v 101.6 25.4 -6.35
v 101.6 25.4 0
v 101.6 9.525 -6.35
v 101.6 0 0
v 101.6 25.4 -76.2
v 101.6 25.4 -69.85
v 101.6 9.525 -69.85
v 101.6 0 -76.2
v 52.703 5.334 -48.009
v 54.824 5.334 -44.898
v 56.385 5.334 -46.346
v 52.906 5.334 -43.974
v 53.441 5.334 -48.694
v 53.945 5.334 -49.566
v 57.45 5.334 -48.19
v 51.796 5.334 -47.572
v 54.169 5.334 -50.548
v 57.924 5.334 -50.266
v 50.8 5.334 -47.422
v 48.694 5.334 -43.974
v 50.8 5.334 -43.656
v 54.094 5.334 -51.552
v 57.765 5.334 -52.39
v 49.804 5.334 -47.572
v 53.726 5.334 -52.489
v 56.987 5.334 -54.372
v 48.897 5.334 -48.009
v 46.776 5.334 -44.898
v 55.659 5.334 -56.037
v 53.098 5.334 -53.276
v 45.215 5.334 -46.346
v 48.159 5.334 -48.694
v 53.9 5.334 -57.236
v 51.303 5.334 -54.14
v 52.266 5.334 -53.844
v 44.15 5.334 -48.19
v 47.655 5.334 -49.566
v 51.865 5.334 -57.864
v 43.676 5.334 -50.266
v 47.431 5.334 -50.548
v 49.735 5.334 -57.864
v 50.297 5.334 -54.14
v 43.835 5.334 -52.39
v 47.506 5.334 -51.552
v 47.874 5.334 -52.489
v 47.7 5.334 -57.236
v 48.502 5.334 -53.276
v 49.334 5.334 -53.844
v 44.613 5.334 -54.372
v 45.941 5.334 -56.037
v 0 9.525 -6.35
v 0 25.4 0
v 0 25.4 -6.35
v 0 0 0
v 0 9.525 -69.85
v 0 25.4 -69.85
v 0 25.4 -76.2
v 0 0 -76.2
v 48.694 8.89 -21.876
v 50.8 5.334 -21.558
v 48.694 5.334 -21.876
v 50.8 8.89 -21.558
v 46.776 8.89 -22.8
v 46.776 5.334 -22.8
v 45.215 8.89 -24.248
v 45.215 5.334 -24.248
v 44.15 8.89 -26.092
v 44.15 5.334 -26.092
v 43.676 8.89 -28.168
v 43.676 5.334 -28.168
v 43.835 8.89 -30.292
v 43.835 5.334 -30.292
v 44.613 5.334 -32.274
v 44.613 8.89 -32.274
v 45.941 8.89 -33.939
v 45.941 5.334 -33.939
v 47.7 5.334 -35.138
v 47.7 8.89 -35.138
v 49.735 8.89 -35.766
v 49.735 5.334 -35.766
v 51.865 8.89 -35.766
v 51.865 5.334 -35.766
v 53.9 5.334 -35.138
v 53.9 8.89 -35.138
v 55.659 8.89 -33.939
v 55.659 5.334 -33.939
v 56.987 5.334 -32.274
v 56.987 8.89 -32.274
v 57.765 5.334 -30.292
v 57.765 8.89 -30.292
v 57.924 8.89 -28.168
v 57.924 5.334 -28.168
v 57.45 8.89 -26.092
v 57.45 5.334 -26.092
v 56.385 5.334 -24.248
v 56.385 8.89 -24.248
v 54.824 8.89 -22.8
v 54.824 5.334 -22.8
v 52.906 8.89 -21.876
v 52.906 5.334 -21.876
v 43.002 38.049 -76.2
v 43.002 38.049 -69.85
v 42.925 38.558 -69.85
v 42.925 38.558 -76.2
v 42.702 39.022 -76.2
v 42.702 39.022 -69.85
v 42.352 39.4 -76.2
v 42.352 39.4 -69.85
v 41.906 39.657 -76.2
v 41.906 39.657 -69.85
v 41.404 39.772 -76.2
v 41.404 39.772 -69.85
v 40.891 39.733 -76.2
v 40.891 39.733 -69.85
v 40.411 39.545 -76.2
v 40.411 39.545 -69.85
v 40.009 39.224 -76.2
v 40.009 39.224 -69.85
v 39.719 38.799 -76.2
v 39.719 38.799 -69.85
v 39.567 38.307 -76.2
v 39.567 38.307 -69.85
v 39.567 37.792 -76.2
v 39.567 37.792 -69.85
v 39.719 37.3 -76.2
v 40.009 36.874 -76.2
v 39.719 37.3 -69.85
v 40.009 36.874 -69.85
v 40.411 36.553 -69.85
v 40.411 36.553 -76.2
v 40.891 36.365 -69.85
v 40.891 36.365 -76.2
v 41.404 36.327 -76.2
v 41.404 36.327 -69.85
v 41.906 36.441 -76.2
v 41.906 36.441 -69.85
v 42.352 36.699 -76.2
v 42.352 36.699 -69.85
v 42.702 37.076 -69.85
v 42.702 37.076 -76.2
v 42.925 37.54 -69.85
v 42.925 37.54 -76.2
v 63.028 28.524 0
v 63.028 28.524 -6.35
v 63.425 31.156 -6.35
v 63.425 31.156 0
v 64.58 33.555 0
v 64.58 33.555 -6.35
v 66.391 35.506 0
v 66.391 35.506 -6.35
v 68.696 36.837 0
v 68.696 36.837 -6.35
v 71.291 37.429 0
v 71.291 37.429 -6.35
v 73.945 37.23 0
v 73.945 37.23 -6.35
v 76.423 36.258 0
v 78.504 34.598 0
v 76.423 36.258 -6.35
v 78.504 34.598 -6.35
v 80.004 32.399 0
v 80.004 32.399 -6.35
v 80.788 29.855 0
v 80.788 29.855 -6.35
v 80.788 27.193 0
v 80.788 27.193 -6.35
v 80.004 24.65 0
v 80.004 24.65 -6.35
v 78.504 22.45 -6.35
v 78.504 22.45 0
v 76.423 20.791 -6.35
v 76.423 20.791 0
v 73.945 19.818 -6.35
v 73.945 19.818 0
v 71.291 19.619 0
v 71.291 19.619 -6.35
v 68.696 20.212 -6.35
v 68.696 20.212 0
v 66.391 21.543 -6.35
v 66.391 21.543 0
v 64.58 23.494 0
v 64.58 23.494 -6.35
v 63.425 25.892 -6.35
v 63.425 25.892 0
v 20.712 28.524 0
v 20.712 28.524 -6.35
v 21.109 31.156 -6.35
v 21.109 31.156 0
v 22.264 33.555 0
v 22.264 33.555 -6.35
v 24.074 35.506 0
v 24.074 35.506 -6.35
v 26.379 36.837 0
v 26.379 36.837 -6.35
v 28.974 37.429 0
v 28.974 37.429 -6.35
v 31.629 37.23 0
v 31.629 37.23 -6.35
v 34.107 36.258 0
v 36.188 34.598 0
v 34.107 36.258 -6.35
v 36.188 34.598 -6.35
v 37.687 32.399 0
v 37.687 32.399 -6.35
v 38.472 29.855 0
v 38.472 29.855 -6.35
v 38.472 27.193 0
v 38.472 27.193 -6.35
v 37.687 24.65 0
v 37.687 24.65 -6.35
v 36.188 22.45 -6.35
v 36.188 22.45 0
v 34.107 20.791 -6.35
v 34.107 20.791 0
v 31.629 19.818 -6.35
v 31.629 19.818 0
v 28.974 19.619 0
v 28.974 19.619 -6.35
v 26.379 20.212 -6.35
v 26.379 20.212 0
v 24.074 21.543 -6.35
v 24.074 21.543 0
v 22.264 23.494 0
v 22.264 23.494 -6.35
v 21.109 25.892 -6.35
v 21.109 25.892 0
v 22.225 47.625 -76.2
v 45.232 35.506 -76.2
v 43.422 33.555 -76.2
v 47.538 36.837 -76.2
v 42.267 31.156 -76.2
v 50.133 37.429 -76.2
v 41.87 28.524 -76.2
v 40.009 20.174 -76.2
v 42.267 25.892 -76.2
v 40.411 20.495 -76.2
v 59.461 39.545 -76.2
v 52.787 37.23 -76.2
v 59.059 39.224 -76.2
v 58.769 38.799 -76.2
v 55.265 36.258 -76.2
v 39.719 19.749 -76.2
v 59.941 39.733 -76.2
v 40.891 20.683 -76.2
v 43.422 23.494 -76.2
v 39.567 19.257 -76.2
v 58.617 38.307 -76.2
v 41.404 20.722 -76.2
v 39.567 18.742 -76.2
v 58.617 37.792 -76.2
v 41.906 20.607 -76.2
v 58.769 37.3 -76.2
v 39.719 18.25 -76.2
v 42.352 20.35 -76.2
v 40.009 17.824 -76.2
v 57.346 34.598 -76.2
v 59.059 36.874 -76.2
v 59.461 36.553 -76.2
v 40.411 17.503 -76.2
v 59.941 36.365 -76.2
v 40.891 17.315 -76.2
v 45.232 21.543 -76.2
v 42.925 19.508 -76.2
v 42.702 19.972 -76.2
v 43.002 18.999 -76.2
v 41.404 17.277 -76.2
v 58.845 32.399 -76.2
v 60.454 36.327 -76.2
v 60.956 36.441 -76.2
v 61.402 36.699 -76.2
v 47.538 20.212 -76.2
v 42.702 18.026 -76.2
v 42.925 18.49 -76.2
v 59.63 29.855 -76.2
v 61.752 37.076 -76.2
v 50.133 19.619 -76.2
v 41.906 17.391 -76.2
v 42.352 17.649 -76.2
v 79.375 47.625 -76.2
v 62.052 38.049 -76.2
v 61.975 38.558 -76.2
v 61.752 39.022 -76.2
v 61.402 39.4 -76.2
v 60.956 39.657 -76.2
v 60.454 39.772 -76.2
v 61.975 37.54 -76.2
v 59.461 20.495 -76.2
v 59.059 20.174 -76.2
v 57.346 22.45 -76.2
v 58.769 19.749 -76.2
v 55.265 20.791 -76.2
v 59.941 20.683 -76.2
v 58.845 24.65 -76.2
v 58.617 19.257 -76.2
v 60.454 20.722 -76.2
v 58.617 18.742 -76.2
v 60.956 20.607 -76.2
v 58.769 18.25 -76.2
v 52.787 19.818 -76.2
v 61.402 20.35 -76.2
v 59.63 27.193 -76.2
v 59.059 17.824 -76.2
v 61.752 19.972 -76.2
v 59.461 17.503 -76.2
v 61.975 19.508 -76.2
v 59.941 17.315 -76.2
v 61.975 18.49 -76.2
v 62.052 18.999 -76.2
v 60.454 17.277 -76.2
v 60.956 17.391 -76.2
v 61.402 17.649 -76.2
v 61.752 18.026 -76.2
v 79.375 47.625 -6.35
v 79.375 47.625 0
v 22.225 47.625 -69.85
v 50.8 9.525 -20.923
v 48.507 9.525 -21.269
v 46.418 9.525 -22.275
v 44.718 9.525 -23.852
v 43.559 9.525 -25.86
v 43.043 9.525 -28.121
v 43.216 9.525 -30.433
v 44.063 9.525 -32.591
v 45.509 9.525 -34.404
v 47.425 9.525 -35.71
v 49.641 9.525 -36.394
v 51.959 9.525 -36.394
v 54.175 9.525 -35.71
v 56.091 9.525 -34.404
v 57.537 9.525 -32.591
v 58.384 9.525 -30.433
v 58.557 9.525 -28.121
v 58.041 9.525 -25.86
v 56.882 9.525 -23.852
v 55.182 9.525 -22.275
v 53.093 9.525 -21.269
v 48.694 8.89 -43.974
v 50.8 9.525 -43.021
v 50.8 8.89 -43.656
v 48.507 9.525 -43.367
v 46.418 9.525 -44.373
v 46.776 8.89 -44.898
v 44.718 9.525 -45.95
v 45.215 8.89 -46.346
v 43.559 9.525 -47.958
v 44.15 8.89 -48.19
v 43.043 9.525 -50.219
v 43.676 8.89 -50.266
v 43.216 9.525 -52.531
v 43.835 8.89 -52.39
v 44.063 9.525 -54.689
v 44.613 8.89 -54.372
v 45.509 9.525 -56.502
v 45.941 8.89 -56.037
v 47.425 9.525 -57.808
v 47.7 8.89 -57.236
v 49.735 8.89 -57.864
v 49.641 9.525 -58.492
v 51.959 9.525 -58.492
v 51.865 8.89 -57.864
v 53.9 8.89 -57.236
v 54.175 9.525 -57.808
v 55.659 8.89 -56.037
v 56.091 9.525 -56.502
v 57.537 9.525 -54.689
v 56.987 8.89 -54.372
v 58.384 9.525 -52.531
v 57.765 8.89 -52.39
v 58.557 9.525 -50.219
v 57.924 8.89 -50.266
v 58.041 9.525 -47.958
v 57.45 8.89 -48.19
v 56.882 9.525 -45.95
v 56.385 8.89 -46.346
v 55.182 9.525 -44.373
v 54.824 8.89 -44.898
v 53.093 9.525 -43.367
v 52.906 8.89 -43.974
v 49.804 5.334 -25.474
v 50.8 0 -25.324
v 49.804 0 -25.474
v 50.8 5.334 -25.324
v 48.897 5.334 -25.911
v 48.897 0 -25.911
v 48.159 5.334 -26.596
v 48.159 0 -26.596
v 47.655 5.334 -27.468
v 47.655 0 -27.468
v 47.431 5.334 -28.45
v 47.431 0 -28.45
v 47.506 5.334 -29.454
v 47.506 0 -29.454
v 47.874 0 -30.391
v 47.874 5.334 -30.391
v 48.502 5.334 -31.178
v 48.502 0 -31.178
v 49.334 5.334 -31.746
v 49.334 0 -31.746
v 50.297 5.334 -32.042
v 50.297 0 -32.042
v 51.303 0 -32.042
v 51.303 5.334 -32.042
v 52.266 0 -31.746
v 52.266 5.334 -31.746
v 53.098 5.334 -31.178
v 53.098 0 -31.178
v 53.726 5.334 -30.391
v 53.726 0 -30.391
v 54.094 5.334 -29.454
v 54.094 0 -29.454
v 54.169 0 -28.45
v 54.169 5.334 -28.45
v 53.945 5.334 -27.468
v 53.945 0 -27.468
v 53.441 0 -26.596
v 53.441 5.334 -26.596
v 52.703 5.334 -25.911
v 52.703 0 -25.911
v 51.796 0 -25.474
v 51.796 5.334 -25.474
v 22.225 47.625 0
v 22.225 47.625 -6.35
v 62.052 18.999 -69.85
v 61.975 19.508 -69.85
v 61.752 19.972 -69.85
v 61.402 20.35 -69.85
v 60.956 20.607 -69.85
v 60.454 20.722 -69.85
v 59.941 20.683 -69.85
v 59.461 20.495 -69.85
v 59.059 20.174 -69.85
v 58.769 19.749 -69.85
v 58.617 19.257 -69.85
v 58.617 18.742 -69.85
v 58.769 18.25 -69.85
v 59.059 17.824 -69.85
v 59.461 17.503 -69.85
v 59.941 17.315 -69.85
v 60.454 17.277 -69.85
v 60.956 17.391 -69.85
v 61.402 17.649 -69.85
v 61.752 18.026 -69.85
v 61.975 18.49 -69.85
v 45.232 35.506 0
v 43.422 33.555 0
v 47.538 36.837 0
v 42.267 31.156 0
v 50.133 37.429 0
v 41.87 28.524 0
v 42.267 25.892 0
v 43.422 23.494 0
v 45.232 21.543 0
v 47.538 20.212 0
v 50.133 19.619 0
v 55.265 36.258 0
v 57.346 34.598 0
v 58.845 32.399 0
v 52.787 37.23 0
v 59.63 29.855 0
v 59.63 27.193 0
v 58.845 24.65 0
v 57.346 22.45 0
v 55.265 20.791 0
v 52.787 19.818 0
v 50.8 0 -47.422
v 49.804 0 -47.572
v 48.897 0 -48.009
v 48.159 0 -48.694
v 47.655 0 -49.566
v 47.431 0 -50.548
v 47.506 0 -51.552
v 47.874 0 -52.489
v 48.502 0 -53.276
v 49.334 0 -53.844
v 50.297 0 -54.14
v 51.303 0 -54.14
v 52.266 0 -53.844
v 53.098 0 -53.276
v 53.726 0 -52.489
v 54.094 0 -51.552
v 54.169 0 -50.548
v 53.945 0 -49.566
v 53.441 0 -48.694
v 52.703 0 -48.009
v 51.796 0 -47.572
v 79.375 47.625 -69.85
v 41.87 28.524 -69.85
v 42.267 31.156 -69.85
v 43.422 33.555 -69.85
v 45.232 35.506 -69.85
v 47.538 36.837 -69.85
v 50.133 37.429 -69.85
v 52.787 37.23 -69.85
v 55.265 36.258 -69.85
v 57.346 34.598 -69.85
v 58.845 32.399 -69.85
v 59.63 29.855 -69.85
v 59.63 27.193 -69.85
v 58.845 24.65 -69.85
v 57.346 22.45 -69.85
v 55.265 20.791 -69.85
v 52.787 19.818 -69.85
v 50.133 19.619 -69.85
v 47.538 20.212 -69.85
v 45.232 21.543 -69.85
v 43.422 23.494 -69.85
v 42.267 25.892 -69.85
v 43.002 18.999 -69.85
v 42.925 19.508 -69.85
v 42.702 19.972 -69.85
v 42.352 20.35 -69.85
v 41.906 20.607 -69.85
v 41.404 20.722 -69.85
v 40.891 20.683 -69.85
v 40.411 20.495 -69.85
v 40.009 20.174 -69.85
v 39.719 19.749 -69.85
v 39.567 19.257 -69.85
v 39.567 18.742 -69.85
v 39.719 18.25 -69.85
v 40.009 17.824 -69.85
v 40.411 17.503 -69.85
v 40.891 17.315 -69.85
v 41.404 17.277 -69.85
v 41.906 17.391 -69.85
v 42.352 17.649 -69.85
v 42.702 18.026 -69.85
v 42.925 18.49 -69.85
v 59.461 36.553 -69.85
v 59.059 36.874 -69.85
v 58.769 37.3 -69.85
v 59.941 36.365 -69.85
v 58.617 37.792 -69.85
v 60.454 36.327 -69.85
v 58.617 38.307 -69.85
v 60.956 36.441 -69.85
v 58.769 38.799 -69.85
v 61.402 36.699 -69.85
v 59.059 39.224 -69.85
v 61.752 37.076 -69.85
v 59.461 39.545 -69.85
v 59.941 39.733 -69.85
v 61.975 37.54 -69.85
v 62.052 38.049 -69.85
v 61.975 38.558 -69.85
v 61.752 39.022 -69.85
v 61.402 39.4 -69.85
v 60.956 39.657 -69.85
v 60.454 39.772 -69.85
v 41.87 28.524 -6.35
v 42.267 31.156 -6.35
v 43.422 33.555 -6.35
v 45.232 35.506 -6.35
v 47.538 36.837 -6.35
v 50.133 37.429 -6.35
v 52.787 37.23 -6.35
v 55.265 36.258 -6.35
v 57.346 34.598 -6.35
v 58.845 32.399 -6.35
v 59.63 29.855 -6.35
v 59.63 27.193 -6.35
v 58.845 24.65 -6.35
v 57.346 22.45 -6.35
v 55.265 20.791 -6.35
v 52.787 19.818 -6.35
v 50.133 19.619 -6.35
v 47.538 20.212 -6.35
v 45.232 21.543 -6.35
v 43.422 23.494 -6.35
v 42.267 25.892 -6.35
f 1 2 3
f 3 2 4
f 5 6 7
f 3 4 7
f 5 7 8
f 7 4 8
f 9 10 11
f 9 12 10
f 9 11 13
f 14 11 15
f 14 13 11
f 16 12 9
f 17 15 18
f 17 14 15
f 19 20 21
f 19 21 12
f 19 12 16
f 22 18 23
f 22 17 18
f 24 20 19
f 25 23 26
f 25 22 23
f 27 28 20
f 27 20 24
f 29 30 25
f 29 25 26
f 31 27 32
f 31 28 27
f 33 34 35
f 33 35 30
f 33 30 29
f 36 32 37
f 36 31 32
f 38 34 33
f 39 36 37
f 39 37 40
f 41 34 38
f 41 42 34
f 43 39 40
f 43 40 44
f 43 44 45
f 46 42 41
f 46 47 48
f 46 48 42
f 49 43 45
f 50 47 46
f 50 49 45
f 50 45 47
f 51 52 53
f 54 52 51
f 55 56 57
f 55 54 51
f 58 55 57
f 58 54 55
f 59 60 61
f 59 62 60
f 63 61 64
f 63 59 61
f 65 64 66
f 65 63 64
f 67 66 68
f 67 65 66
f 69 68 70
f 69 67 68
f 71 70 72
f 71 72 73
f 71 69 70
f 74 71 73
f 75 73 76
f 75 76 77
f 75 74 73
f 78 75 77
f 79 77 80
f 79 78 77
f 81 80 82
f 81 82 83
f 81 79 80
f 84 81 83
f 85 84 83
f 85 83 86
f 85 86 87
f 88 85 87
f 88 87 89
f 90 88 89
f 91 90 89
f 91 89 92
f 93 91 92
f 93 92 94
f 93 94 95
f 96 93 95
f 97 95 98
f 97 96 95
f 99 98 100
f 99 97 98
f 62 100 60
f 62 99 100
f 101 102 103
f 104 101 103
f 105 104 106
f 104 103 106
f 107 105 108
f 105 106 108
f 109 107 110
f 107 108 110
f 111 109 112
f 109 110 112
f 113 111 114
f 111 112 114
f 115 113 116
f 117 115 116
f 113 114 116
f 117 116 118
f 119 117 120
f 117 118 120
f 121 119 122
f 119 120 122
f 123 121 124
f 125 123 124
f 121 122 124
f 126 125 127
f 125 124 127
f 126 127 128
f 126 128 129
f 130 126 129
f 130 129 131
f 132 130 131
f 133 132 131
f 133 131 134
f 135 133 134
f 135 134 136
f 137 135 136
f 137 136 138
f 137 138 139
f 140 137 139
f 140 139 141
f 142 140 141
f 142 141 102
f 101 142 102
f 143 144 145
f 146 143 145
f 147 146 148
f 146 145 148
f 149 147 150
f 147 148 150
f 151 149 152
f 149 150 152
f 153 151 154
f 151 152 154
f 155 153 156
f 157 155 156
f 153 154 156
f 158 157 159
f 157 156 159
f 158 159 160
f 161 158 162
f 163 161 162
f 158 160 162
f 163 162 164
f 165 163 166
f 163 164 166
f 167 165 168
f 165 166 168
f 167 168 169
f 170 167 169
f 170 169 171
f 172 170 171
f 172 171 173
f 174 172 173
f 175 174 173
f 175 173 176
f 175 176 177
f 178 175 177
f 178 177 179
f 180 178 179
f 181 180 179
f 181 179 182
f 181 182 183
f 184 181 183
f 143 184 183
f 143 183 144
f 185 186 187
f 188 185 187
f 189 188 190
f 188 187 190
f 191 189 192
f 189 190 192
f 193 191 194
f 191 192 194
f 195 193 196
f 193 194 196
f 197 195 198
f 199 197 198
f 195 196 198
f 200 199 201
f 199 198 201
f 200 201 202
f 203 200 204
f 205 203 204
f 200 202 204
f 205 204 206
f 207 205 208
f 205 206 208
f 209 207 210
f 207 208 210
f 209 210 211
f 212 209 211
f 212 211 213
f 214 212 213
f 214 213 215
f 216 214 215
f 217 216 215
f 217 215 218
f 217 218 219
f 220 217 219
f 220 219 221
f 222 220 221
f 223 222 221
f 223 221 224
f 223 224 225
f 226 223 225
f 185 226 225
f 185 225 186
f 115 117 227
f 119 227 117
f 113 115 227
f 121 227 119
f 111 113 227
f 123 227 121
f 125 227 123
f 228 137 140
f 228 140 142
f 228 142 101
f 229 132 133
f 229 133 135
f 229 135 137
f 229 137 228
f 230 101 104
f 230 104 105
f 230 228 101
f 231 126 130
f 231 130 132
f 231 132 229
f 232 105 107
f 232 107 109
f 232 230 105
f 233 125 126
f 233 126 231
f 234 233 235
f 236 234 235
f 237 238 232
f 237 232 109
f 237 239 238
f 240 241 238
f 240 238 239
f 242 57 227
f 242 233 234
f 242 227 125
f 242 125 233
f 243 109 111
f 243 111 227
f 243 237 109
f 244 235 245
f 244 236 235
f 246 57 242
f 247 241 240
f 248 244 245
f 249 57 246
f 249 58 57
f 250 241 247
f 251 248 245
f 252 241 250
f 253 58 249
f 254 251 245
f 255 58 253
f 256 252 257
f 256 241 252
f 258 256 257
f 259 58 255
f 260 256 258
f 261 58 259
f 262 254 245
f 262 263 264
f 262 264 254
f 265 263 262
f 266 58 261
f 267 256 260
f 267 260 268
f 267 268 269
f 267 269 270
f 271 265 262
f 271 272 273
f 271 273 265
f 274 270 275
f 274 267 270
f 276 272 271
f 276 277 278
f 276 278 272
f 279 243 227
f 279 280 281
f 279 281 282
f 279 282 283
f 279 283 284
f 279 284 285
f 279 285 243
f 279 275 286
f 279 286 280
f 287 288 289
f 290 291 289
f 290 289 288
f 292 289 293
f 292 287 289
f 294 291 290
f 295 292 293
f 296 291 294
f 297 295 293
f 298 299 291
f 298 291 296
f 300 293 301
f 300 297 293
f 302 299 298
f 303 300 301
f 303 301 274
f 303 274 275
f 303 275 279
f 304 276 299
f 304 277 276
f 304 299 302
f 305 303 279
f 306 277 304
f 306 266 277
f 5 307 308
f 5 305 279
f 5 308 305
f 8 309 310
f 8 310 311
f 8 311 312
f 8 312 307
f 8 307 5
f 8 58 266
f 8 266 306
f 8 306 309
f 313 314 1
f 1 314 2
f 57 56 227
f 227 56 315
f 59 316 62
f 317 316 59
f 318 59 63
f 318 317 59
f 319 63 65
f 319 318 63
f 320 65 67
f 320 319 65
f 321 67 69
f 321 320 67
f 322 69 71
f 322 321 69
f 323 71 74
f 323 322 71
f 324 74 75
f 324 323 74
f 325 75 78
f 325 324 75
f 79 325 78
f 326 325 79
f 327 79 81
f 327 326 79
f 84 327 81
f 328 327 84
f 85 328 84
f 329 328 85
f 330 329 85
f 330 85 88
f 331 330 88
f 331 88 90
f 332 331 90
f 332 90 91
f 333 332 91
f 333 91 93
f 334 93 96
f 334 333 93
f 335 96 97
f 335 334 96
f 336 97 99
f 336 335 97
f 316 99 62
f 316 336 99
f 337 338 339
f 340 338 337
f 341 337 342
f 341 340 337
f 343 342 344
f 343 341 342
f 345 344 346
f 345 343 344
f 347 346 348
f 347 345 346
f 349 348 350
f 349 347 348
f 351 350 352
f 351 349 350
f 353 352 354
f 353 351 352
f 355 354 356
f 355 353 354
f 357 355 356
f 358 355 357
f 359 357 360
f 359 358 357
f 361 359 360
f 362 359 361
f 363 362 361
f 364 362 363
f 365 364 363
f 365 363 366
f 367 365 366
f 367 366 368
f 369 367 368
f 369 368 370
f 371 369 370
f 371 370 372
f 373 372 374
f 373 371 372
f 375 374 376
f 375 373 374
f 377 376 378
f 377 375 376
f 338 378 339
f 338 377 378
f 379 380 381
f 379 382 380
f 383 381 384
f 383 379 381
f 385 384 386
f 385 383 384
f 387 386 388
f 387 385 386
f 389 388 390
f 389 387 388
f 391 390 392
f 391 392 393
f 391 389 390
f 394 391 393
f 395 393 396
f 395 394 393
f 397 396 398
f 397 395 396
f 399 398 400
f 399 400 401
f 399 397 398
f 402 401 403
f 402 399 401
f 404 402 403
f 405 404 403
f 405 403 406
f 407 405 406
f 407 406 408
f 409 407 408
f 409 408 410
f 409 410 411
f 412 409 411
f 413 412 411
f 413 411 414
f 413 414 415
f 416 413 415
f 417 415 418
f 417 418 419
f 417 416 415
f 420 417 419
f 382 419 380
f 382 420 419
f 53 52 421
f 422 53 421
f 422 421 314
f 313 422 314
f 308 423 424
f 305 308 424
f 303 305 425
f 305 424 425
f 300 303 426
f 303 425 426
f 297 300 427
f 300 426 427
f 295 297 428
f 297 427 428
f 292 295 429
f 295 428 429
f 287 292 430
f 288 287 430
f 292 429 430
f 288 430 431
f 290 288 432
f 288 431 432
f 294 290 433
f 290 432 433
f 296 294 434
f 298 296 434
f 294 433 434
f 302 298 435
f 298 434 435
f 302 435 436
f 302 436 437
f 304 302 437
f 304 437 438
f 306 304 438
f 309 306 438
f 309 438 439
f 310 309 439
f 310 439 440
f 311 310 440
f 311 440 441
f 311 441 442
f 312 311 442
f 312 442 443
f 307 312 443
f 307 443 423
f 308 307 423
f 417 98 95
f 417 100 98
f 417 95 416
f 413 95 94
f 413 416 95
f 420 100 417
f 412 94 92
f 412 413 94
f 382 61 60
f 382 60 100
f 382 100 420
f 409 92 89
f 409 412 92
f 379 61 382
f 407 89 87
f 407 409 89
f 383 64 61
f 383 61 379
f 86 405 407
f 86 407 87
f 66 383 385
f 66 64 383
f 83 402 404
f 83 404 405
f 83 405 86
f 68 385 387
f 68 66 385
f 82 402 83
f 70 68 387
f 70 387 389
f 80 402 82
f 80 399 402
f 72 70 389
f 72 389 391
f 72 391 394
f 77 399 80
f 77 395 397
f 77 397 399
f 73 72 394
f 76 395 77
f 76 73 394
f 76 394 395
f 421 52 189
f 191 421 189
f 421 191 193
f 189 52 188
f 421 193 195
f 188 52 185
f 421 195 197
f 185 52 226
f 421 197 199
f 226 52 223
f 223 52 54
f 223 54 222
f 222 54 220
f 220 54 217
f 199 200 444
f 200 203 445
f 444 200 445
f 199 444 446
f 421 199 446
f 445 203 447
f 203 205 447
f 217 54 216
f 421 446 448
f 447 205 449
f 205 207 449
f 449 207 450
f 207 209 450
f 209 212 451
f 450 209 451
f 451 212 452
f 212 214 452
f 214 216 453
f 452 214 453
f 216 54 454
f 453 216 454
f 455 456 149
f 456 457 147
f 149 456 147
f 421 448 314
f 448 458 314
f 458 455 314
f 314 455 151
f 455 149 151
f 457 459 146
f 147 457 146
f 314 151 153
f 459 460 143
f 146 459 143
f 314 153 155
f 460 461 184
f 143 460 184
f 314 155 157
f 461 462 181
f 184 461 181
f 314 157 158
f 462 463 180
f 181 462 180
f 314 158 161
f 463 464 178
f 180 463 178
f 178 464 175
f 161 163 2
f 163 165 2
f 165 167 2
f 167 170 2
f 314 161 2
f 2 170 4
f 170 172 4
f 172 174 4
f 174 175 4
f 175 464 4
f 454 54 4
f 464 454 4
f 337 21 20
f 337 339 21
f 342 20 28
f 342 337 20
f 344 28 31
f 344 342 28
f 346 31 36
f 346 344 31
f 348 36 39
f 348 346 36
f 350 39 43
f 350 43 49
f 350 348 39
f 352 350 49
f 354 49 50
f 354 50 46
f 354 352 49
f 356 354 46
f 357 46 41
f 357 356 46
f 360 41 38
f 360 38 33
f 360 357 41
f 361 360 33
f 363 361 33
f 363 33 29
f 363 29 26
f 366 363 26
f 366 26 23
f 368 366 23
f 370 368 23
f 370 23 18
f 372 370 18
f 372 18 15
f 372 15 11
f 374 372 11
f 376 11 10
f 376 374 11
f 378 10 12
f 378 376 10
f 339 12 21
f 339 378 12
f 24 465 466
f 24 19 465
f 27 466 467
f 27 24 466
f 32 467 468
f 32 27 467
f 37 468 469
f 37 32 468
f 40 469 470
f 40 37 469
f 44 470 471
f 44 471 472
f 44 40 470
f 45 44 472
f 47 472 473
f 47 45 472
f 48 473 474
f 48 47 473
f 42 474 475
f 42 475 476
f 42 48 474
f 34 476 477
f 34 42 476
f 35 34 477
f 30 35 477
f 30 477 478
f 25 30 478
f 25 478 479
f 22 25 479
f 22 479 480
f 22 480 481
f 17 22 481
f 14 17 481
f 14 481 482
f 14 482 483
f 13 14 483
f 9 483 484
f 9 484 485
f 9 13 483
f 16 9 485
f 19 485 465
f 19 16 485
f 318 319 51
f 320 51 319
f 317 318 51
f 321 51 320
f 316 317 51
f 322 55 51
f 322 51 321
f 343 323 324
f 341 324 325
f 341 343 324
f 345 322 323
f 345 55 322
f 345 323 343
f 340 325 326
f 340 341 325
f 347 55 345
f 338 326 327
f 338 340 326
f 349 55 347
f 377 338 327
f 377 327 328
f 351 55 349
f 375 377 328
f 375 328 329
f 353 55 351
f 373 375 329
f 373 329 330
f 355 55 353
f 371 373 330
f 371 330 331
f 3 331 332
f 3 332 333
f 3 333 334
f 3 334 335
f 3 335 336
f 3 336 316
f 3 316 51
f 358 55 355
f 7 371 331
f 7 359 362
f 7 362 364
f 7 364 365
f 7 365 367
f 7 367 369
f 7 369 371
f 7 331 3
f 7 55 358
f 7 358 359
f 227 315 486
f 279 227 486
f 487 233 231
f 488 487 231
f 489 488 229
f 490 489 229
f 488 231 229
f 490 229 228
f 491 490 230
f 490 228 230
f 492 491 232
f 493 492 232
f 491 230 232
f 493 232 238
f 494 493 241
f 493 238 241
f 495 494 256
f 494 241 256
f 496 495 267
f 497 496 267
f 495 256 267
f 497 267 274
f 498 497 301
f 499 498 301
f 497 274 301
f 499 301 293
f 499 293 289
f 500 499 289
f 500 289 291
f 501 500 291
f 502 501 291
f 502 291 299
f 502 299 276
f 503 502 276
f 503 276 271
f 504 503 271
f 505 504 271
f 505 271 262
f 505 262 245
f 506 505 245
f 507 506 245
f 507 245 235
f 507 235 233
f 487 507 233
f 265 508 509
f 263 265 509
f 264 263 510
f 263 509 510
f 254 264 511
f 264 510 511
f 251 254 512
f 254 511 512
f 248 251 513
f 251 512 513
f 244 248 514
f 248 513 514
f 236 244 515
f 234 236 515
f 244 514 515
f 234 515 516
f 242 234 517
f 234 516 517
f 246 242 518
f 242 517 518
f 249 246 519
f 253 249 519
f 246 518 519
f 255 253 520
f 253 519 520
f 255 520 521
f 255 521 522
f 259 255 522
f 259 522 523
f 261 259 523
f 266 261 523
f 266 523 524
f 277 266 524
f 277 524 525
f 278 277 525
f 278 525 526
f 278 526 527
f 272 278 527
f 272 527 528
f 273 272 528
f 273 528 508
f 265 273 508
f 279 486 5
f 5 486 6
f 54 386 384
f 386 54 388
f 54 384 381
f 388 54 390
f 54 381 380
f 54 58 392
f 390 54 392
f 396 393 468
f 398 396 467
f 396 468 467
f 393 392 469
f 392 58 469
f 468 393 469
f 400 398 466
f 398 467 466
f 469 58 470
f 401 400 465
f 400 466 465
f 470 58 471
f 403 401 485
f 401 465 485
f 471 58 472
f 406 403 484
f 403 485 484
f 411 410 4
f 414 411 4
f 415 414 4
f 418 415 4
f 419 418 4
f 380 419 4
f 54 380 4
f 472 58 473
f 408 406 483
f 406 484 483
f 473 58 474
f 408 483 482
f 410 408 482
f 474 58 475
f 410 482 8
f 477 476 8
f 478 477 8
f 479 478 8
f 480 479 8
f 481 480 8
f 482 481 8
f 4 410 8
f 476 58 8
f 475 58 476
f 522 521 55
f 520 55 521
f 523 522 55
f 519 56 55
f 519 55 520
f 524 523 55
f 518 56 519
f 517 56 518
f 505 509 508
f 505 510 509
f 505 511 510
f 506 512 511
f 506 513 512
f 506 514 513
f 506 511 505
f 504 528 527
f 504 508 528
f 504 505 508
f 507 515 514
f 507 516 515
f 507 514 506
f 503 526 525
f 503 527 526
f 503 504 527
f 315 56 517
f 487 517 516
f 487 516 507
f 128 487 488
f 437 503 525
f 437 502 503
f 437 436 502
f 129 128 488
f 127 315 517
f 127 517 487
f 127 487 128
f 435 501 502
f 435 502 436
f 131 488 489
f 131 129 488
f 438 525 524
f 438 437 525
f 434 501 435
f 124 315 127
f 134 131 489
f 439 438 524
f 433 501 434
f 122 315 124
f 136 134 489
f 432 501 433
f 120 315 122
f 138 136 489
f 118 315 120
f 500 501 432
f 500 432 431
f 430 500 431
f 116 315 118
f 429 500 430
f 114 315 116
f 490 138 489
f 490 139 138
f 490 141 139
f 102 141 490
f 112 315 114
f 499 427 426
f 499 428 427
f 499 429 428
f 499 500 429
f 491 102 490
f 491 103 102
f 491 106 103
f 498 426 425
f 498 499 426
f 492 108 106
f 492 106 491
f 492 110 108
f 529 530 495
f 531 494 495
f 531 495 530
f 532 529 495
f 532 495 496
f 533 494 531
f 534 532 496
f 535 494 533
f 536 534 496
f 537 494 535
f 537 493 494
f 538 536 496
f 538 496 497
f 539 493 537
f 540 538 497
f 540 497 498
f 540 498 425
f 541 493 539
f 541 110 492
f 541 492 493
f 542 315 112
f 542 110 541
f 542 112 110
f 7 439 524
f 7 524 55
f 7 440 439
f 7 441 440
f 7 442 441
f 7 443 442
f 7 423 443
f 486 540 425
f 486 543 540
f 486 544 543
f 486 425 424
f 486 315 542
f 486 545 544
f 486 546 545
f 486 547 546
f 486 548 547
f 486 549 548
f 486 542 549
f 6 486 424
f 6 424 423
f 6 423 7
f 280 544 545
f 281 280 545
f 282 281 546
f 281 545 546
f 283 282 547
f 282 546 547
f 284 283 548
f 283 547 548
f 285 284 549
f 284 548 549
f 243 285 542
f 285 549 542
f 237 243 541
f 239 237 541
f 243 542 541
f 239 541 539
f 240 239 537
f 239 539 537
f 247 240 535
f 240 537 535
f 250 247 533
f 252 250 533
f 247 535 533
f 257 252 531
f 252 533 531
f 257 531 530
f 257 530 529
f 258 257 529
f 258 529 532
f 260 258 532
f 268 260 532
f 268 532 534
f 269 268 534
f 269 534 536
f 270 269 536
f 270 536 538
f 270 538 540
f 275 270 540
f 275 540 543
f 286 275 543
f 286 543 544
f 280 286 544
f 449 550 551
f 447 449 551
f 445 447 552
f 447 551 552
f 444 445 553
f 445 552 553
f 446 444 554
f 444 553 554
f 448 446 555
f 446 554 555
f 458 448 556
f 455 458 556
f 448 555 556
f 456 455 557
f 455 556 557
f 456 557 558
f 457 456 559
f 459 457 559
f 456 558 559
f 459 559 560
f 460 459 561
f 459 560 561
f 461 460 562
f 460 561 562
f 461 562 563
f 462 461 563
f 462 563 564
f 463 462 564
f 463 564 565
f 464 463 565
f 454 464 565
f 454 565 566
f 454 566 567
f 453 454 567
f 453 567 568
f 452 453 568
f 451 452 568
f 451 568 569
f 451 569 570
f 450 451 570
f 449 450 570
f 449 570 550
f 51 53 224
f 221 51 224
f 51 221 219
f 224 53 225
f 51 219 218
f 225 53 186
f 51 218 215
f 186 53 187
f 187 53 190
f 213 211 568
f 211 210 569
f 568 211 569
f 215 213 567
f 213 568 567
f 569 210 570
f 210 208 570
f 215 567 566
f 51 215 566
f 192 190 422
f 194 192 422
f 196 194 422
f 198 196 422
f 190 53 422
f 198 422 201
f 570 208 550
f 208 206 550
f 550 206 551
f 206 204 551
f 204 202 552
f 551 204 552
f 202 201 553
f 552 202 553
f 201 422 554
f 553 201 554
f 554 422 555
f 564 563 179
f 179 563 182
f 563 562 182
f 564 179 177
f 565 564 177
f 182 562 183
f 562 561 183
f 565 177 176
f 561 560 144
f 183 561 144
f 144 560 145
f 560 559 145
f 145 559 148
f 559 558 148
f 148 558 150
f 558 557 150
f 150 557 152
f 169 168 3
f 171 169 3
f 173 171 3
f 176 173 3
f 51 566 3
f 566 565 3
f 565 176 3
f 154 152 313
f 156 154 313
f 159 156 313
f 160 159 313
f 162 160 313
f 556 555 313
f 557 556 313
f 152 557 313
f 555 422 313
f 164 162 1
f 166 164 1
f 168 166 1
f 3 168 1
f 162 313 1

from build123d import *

# Parameters (mm, degrees)
SKETCH1_W                                    = 101.6
SKETCH1_H                                    = 76.2
BOSS_EXTRUDE1_DEPTH                          = 50.8
CUT_EXTRUDE1_DEPTH                           = 31.75
CUT_EXTRUDE1_DEPTH_BACK                      = 31.75
SKETCH9_W                                    = 101.6
SKETCH9_H                                    = 41.275
F_45_64_0_70313_DIAMETER_HOLE1_D             = 17.859502
F_45_64_0_70313_DIAMETER_HOLE2_D             = 17.859502
F_45_64_0_70313_DIAMETER_HOLE2_DEPTH         = 25.4
F_45_64_0_70313_DIAMETER_HOLE2_TIP           = 5.365535714
CBORE_FOR_1_4_BINDING_HEAD_MACHINE_S_2_COUNT = 2
CBORE_FOR_1_4_BINDING_HEAD_MACHINE_S_2_PITCH = 22.098
CUT_EXTRUDE3_DEPTH                           = 137.783186101
F_8_32_TAPPED_HOLE1_D                        = 3.4544
F_8_32_TAPPED_HOLE1_DEPTH                    = 6.35


with BuildPart() as part:
    # Sketch1 → Boss-Extrude1 (new body)
    with BuildSketch(Plane(origin=(0, 0, 0), x_dir=(1, 0, 0), z_dir=(0, 1, 0))):
        with Locations((50.8, 38.1)):
            Rectangle(SKETCH1_W, SKETCH1_H)
    extrude(amount=BOSS_EXTRUDE1_DEPTH)

    # Sketch9 → Cut-Extrude1 (cut, two sides: drawn at the far end of the back side and taken through both)
    with BuildSketch(Plane.XY.offset(-38.1).offset(-CUT_EXTRUDE1_DEPTH_BACK)):
        with Locations((50.8, 30.1625)):
            Rectangle(SKETCH9_W, SKETCH9_H)
    extrude(amount=CUT_EXTRUDE1_DEPTH + CUT_EXTRUDE1_DEPTH_BACK, mode=Mode.SUBTRACT)

    # 45/64 (0.70313) Diameter Hole1 (through all)
    with Locations(Plane.XY):
        with Locations((50.8, 28.5242)):
            Hole(F_45_64_0_70313_DIAMETER_HOLE1_D / 2)

    # 45/64 (0.70313) Diameter Hole2
    with Locations(Plane.XY):
        with Locations((29.6418, 28.5242), (71.9582, 28.5242)):
            Hole(F_45_64_0_70313_DIAMETER_HOLE2_D / 2, depth=F_45_64_0_70313_DIAMETER_HOLE2_DEPTH)
            with Locations((0, 0, -(F_45_64_0_70313_DIAMETER_HOLE2_DEPTH + F_45_64_0_70313_DIAMETER_HOLE2_TIP / 2))):  # 118° drill point
                Cone(0, F_45_64_0_70313_DIAMETER_HOLE2_D / 2, F_45_64_0_70313_DIAMETER_HOLE2_TIP, mode=Mode.SUBTRACT)

    # Sketch14 → CBORE for 1/4 Binding Head Machine Screw1 (revolve, cut)
    with BuildSketch(Plane(origin=(50.8, 9.525, -50.8), x_dir=(0, 0, 1), z_dir=(1, 0, 0))):
        Polygon((0, 0), (0, 9.525), (3.3782, 9.525), (3.3782, 4.191), (7.14375, 4.191), (7.14375, 0.635), (7.77875, 0), align=None)
    cbore_for_1_4_binding_head_machine_screw = revolve(axis=Axis((50.8, 15.875, -50.8), (0, -1, 0)), mode=Mode.SUBTRACT)

    # CBORE for 1_4 Binding Head Machine S 2: CBORE for 1/4 Binding Head Machine Screw1 ×2
    with Locations(*[(0, 0, i * CBORE_FOR_1_4_BINDING_HEAD_MACHINE_S_2_PITCH) for i in range(1, CBORE_FOR_1_4_BINDING_HEAD_MACHINE_S_2_COUNT)]):
        add(cbore_for_1_4_binding_head_machine_screw, mode=Mode.SUBTRACT)

    # Sketch17 → Cut-Extrude3 (cut, through all)
    with BuildSketch(Plane.XY):
        Polygon((0, 25.4), (22.225, 47.625), (79.375, 47.625), (101.6, 25.4), (101.6, 50.8), (0, 50.8), align=None)
    extrude(amount=-CUT_EXTRUDE3_DEPTH, mode=Mode.SUBTRACT)

    # #8-32 Tapped Hole1
    with Locations(Plane(origin=(0, 0, -76.2), x_dir=(-1, 0, 0), z_dir=(0, 0, -1))):
        with Locations((-41.275, 38.0492), (-60.325, 18.9992), (-60.325, 38.0492), (-41.275, 18.9992)):
            Hole(F_8_32_TAPPED_HOLE1_D / 2, depth=F_8_32_TAPPED_HOLE1_DEPTH)


solid = part.part
